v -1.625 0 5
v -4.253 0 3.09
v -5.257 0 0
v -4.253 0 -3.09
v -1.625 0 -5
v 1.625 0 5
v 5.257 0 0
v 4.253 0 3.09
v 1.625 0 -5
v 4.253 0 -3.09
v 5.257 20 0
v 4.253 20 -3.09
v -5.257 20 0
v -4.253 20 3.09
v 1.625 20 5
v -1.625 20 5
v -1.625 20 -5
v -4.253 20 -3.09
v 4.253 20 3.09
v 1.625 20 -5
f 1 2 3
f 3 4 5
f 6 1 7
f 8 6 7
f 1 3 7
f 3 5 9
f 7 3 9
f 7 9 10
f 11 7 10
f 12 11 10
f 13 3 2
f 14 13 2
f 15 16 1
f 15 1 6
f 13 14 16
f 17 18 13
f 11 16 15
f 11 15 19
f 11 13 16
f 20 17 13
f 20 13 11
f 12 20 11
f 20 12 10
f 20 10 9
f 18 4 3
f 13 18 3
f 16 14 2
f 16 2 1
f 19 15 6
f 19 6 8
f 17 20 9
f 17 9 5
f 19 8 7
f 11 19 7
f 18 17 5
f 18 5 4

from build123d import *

# Parameters (mm, degrees)
EXTRUDE1_DEPTH = 20


with BuildPart() as part:
    # Sketch1 → Extrude1 (new body)
    with BuildSketch(Plane(origin=(0, 0, 0), x_dir=(1, 0, 0), z_dir=(0, 1, 0))):
        Polygon((4.253254042, -3.090169944), (5.257311121, 0), (4.253254042, 3.090169944), (1.624598481, 5), (-1.624598481, 5), (-4.253254042, 3.090169944), (-5.257311121, 0), (-4.253254042, -3.090169944), (-1.624598481, -5), (1.624598481, -5), align=None)
    extrude(amount=EXTRUDE1_DEPTH)


solid = part.part
